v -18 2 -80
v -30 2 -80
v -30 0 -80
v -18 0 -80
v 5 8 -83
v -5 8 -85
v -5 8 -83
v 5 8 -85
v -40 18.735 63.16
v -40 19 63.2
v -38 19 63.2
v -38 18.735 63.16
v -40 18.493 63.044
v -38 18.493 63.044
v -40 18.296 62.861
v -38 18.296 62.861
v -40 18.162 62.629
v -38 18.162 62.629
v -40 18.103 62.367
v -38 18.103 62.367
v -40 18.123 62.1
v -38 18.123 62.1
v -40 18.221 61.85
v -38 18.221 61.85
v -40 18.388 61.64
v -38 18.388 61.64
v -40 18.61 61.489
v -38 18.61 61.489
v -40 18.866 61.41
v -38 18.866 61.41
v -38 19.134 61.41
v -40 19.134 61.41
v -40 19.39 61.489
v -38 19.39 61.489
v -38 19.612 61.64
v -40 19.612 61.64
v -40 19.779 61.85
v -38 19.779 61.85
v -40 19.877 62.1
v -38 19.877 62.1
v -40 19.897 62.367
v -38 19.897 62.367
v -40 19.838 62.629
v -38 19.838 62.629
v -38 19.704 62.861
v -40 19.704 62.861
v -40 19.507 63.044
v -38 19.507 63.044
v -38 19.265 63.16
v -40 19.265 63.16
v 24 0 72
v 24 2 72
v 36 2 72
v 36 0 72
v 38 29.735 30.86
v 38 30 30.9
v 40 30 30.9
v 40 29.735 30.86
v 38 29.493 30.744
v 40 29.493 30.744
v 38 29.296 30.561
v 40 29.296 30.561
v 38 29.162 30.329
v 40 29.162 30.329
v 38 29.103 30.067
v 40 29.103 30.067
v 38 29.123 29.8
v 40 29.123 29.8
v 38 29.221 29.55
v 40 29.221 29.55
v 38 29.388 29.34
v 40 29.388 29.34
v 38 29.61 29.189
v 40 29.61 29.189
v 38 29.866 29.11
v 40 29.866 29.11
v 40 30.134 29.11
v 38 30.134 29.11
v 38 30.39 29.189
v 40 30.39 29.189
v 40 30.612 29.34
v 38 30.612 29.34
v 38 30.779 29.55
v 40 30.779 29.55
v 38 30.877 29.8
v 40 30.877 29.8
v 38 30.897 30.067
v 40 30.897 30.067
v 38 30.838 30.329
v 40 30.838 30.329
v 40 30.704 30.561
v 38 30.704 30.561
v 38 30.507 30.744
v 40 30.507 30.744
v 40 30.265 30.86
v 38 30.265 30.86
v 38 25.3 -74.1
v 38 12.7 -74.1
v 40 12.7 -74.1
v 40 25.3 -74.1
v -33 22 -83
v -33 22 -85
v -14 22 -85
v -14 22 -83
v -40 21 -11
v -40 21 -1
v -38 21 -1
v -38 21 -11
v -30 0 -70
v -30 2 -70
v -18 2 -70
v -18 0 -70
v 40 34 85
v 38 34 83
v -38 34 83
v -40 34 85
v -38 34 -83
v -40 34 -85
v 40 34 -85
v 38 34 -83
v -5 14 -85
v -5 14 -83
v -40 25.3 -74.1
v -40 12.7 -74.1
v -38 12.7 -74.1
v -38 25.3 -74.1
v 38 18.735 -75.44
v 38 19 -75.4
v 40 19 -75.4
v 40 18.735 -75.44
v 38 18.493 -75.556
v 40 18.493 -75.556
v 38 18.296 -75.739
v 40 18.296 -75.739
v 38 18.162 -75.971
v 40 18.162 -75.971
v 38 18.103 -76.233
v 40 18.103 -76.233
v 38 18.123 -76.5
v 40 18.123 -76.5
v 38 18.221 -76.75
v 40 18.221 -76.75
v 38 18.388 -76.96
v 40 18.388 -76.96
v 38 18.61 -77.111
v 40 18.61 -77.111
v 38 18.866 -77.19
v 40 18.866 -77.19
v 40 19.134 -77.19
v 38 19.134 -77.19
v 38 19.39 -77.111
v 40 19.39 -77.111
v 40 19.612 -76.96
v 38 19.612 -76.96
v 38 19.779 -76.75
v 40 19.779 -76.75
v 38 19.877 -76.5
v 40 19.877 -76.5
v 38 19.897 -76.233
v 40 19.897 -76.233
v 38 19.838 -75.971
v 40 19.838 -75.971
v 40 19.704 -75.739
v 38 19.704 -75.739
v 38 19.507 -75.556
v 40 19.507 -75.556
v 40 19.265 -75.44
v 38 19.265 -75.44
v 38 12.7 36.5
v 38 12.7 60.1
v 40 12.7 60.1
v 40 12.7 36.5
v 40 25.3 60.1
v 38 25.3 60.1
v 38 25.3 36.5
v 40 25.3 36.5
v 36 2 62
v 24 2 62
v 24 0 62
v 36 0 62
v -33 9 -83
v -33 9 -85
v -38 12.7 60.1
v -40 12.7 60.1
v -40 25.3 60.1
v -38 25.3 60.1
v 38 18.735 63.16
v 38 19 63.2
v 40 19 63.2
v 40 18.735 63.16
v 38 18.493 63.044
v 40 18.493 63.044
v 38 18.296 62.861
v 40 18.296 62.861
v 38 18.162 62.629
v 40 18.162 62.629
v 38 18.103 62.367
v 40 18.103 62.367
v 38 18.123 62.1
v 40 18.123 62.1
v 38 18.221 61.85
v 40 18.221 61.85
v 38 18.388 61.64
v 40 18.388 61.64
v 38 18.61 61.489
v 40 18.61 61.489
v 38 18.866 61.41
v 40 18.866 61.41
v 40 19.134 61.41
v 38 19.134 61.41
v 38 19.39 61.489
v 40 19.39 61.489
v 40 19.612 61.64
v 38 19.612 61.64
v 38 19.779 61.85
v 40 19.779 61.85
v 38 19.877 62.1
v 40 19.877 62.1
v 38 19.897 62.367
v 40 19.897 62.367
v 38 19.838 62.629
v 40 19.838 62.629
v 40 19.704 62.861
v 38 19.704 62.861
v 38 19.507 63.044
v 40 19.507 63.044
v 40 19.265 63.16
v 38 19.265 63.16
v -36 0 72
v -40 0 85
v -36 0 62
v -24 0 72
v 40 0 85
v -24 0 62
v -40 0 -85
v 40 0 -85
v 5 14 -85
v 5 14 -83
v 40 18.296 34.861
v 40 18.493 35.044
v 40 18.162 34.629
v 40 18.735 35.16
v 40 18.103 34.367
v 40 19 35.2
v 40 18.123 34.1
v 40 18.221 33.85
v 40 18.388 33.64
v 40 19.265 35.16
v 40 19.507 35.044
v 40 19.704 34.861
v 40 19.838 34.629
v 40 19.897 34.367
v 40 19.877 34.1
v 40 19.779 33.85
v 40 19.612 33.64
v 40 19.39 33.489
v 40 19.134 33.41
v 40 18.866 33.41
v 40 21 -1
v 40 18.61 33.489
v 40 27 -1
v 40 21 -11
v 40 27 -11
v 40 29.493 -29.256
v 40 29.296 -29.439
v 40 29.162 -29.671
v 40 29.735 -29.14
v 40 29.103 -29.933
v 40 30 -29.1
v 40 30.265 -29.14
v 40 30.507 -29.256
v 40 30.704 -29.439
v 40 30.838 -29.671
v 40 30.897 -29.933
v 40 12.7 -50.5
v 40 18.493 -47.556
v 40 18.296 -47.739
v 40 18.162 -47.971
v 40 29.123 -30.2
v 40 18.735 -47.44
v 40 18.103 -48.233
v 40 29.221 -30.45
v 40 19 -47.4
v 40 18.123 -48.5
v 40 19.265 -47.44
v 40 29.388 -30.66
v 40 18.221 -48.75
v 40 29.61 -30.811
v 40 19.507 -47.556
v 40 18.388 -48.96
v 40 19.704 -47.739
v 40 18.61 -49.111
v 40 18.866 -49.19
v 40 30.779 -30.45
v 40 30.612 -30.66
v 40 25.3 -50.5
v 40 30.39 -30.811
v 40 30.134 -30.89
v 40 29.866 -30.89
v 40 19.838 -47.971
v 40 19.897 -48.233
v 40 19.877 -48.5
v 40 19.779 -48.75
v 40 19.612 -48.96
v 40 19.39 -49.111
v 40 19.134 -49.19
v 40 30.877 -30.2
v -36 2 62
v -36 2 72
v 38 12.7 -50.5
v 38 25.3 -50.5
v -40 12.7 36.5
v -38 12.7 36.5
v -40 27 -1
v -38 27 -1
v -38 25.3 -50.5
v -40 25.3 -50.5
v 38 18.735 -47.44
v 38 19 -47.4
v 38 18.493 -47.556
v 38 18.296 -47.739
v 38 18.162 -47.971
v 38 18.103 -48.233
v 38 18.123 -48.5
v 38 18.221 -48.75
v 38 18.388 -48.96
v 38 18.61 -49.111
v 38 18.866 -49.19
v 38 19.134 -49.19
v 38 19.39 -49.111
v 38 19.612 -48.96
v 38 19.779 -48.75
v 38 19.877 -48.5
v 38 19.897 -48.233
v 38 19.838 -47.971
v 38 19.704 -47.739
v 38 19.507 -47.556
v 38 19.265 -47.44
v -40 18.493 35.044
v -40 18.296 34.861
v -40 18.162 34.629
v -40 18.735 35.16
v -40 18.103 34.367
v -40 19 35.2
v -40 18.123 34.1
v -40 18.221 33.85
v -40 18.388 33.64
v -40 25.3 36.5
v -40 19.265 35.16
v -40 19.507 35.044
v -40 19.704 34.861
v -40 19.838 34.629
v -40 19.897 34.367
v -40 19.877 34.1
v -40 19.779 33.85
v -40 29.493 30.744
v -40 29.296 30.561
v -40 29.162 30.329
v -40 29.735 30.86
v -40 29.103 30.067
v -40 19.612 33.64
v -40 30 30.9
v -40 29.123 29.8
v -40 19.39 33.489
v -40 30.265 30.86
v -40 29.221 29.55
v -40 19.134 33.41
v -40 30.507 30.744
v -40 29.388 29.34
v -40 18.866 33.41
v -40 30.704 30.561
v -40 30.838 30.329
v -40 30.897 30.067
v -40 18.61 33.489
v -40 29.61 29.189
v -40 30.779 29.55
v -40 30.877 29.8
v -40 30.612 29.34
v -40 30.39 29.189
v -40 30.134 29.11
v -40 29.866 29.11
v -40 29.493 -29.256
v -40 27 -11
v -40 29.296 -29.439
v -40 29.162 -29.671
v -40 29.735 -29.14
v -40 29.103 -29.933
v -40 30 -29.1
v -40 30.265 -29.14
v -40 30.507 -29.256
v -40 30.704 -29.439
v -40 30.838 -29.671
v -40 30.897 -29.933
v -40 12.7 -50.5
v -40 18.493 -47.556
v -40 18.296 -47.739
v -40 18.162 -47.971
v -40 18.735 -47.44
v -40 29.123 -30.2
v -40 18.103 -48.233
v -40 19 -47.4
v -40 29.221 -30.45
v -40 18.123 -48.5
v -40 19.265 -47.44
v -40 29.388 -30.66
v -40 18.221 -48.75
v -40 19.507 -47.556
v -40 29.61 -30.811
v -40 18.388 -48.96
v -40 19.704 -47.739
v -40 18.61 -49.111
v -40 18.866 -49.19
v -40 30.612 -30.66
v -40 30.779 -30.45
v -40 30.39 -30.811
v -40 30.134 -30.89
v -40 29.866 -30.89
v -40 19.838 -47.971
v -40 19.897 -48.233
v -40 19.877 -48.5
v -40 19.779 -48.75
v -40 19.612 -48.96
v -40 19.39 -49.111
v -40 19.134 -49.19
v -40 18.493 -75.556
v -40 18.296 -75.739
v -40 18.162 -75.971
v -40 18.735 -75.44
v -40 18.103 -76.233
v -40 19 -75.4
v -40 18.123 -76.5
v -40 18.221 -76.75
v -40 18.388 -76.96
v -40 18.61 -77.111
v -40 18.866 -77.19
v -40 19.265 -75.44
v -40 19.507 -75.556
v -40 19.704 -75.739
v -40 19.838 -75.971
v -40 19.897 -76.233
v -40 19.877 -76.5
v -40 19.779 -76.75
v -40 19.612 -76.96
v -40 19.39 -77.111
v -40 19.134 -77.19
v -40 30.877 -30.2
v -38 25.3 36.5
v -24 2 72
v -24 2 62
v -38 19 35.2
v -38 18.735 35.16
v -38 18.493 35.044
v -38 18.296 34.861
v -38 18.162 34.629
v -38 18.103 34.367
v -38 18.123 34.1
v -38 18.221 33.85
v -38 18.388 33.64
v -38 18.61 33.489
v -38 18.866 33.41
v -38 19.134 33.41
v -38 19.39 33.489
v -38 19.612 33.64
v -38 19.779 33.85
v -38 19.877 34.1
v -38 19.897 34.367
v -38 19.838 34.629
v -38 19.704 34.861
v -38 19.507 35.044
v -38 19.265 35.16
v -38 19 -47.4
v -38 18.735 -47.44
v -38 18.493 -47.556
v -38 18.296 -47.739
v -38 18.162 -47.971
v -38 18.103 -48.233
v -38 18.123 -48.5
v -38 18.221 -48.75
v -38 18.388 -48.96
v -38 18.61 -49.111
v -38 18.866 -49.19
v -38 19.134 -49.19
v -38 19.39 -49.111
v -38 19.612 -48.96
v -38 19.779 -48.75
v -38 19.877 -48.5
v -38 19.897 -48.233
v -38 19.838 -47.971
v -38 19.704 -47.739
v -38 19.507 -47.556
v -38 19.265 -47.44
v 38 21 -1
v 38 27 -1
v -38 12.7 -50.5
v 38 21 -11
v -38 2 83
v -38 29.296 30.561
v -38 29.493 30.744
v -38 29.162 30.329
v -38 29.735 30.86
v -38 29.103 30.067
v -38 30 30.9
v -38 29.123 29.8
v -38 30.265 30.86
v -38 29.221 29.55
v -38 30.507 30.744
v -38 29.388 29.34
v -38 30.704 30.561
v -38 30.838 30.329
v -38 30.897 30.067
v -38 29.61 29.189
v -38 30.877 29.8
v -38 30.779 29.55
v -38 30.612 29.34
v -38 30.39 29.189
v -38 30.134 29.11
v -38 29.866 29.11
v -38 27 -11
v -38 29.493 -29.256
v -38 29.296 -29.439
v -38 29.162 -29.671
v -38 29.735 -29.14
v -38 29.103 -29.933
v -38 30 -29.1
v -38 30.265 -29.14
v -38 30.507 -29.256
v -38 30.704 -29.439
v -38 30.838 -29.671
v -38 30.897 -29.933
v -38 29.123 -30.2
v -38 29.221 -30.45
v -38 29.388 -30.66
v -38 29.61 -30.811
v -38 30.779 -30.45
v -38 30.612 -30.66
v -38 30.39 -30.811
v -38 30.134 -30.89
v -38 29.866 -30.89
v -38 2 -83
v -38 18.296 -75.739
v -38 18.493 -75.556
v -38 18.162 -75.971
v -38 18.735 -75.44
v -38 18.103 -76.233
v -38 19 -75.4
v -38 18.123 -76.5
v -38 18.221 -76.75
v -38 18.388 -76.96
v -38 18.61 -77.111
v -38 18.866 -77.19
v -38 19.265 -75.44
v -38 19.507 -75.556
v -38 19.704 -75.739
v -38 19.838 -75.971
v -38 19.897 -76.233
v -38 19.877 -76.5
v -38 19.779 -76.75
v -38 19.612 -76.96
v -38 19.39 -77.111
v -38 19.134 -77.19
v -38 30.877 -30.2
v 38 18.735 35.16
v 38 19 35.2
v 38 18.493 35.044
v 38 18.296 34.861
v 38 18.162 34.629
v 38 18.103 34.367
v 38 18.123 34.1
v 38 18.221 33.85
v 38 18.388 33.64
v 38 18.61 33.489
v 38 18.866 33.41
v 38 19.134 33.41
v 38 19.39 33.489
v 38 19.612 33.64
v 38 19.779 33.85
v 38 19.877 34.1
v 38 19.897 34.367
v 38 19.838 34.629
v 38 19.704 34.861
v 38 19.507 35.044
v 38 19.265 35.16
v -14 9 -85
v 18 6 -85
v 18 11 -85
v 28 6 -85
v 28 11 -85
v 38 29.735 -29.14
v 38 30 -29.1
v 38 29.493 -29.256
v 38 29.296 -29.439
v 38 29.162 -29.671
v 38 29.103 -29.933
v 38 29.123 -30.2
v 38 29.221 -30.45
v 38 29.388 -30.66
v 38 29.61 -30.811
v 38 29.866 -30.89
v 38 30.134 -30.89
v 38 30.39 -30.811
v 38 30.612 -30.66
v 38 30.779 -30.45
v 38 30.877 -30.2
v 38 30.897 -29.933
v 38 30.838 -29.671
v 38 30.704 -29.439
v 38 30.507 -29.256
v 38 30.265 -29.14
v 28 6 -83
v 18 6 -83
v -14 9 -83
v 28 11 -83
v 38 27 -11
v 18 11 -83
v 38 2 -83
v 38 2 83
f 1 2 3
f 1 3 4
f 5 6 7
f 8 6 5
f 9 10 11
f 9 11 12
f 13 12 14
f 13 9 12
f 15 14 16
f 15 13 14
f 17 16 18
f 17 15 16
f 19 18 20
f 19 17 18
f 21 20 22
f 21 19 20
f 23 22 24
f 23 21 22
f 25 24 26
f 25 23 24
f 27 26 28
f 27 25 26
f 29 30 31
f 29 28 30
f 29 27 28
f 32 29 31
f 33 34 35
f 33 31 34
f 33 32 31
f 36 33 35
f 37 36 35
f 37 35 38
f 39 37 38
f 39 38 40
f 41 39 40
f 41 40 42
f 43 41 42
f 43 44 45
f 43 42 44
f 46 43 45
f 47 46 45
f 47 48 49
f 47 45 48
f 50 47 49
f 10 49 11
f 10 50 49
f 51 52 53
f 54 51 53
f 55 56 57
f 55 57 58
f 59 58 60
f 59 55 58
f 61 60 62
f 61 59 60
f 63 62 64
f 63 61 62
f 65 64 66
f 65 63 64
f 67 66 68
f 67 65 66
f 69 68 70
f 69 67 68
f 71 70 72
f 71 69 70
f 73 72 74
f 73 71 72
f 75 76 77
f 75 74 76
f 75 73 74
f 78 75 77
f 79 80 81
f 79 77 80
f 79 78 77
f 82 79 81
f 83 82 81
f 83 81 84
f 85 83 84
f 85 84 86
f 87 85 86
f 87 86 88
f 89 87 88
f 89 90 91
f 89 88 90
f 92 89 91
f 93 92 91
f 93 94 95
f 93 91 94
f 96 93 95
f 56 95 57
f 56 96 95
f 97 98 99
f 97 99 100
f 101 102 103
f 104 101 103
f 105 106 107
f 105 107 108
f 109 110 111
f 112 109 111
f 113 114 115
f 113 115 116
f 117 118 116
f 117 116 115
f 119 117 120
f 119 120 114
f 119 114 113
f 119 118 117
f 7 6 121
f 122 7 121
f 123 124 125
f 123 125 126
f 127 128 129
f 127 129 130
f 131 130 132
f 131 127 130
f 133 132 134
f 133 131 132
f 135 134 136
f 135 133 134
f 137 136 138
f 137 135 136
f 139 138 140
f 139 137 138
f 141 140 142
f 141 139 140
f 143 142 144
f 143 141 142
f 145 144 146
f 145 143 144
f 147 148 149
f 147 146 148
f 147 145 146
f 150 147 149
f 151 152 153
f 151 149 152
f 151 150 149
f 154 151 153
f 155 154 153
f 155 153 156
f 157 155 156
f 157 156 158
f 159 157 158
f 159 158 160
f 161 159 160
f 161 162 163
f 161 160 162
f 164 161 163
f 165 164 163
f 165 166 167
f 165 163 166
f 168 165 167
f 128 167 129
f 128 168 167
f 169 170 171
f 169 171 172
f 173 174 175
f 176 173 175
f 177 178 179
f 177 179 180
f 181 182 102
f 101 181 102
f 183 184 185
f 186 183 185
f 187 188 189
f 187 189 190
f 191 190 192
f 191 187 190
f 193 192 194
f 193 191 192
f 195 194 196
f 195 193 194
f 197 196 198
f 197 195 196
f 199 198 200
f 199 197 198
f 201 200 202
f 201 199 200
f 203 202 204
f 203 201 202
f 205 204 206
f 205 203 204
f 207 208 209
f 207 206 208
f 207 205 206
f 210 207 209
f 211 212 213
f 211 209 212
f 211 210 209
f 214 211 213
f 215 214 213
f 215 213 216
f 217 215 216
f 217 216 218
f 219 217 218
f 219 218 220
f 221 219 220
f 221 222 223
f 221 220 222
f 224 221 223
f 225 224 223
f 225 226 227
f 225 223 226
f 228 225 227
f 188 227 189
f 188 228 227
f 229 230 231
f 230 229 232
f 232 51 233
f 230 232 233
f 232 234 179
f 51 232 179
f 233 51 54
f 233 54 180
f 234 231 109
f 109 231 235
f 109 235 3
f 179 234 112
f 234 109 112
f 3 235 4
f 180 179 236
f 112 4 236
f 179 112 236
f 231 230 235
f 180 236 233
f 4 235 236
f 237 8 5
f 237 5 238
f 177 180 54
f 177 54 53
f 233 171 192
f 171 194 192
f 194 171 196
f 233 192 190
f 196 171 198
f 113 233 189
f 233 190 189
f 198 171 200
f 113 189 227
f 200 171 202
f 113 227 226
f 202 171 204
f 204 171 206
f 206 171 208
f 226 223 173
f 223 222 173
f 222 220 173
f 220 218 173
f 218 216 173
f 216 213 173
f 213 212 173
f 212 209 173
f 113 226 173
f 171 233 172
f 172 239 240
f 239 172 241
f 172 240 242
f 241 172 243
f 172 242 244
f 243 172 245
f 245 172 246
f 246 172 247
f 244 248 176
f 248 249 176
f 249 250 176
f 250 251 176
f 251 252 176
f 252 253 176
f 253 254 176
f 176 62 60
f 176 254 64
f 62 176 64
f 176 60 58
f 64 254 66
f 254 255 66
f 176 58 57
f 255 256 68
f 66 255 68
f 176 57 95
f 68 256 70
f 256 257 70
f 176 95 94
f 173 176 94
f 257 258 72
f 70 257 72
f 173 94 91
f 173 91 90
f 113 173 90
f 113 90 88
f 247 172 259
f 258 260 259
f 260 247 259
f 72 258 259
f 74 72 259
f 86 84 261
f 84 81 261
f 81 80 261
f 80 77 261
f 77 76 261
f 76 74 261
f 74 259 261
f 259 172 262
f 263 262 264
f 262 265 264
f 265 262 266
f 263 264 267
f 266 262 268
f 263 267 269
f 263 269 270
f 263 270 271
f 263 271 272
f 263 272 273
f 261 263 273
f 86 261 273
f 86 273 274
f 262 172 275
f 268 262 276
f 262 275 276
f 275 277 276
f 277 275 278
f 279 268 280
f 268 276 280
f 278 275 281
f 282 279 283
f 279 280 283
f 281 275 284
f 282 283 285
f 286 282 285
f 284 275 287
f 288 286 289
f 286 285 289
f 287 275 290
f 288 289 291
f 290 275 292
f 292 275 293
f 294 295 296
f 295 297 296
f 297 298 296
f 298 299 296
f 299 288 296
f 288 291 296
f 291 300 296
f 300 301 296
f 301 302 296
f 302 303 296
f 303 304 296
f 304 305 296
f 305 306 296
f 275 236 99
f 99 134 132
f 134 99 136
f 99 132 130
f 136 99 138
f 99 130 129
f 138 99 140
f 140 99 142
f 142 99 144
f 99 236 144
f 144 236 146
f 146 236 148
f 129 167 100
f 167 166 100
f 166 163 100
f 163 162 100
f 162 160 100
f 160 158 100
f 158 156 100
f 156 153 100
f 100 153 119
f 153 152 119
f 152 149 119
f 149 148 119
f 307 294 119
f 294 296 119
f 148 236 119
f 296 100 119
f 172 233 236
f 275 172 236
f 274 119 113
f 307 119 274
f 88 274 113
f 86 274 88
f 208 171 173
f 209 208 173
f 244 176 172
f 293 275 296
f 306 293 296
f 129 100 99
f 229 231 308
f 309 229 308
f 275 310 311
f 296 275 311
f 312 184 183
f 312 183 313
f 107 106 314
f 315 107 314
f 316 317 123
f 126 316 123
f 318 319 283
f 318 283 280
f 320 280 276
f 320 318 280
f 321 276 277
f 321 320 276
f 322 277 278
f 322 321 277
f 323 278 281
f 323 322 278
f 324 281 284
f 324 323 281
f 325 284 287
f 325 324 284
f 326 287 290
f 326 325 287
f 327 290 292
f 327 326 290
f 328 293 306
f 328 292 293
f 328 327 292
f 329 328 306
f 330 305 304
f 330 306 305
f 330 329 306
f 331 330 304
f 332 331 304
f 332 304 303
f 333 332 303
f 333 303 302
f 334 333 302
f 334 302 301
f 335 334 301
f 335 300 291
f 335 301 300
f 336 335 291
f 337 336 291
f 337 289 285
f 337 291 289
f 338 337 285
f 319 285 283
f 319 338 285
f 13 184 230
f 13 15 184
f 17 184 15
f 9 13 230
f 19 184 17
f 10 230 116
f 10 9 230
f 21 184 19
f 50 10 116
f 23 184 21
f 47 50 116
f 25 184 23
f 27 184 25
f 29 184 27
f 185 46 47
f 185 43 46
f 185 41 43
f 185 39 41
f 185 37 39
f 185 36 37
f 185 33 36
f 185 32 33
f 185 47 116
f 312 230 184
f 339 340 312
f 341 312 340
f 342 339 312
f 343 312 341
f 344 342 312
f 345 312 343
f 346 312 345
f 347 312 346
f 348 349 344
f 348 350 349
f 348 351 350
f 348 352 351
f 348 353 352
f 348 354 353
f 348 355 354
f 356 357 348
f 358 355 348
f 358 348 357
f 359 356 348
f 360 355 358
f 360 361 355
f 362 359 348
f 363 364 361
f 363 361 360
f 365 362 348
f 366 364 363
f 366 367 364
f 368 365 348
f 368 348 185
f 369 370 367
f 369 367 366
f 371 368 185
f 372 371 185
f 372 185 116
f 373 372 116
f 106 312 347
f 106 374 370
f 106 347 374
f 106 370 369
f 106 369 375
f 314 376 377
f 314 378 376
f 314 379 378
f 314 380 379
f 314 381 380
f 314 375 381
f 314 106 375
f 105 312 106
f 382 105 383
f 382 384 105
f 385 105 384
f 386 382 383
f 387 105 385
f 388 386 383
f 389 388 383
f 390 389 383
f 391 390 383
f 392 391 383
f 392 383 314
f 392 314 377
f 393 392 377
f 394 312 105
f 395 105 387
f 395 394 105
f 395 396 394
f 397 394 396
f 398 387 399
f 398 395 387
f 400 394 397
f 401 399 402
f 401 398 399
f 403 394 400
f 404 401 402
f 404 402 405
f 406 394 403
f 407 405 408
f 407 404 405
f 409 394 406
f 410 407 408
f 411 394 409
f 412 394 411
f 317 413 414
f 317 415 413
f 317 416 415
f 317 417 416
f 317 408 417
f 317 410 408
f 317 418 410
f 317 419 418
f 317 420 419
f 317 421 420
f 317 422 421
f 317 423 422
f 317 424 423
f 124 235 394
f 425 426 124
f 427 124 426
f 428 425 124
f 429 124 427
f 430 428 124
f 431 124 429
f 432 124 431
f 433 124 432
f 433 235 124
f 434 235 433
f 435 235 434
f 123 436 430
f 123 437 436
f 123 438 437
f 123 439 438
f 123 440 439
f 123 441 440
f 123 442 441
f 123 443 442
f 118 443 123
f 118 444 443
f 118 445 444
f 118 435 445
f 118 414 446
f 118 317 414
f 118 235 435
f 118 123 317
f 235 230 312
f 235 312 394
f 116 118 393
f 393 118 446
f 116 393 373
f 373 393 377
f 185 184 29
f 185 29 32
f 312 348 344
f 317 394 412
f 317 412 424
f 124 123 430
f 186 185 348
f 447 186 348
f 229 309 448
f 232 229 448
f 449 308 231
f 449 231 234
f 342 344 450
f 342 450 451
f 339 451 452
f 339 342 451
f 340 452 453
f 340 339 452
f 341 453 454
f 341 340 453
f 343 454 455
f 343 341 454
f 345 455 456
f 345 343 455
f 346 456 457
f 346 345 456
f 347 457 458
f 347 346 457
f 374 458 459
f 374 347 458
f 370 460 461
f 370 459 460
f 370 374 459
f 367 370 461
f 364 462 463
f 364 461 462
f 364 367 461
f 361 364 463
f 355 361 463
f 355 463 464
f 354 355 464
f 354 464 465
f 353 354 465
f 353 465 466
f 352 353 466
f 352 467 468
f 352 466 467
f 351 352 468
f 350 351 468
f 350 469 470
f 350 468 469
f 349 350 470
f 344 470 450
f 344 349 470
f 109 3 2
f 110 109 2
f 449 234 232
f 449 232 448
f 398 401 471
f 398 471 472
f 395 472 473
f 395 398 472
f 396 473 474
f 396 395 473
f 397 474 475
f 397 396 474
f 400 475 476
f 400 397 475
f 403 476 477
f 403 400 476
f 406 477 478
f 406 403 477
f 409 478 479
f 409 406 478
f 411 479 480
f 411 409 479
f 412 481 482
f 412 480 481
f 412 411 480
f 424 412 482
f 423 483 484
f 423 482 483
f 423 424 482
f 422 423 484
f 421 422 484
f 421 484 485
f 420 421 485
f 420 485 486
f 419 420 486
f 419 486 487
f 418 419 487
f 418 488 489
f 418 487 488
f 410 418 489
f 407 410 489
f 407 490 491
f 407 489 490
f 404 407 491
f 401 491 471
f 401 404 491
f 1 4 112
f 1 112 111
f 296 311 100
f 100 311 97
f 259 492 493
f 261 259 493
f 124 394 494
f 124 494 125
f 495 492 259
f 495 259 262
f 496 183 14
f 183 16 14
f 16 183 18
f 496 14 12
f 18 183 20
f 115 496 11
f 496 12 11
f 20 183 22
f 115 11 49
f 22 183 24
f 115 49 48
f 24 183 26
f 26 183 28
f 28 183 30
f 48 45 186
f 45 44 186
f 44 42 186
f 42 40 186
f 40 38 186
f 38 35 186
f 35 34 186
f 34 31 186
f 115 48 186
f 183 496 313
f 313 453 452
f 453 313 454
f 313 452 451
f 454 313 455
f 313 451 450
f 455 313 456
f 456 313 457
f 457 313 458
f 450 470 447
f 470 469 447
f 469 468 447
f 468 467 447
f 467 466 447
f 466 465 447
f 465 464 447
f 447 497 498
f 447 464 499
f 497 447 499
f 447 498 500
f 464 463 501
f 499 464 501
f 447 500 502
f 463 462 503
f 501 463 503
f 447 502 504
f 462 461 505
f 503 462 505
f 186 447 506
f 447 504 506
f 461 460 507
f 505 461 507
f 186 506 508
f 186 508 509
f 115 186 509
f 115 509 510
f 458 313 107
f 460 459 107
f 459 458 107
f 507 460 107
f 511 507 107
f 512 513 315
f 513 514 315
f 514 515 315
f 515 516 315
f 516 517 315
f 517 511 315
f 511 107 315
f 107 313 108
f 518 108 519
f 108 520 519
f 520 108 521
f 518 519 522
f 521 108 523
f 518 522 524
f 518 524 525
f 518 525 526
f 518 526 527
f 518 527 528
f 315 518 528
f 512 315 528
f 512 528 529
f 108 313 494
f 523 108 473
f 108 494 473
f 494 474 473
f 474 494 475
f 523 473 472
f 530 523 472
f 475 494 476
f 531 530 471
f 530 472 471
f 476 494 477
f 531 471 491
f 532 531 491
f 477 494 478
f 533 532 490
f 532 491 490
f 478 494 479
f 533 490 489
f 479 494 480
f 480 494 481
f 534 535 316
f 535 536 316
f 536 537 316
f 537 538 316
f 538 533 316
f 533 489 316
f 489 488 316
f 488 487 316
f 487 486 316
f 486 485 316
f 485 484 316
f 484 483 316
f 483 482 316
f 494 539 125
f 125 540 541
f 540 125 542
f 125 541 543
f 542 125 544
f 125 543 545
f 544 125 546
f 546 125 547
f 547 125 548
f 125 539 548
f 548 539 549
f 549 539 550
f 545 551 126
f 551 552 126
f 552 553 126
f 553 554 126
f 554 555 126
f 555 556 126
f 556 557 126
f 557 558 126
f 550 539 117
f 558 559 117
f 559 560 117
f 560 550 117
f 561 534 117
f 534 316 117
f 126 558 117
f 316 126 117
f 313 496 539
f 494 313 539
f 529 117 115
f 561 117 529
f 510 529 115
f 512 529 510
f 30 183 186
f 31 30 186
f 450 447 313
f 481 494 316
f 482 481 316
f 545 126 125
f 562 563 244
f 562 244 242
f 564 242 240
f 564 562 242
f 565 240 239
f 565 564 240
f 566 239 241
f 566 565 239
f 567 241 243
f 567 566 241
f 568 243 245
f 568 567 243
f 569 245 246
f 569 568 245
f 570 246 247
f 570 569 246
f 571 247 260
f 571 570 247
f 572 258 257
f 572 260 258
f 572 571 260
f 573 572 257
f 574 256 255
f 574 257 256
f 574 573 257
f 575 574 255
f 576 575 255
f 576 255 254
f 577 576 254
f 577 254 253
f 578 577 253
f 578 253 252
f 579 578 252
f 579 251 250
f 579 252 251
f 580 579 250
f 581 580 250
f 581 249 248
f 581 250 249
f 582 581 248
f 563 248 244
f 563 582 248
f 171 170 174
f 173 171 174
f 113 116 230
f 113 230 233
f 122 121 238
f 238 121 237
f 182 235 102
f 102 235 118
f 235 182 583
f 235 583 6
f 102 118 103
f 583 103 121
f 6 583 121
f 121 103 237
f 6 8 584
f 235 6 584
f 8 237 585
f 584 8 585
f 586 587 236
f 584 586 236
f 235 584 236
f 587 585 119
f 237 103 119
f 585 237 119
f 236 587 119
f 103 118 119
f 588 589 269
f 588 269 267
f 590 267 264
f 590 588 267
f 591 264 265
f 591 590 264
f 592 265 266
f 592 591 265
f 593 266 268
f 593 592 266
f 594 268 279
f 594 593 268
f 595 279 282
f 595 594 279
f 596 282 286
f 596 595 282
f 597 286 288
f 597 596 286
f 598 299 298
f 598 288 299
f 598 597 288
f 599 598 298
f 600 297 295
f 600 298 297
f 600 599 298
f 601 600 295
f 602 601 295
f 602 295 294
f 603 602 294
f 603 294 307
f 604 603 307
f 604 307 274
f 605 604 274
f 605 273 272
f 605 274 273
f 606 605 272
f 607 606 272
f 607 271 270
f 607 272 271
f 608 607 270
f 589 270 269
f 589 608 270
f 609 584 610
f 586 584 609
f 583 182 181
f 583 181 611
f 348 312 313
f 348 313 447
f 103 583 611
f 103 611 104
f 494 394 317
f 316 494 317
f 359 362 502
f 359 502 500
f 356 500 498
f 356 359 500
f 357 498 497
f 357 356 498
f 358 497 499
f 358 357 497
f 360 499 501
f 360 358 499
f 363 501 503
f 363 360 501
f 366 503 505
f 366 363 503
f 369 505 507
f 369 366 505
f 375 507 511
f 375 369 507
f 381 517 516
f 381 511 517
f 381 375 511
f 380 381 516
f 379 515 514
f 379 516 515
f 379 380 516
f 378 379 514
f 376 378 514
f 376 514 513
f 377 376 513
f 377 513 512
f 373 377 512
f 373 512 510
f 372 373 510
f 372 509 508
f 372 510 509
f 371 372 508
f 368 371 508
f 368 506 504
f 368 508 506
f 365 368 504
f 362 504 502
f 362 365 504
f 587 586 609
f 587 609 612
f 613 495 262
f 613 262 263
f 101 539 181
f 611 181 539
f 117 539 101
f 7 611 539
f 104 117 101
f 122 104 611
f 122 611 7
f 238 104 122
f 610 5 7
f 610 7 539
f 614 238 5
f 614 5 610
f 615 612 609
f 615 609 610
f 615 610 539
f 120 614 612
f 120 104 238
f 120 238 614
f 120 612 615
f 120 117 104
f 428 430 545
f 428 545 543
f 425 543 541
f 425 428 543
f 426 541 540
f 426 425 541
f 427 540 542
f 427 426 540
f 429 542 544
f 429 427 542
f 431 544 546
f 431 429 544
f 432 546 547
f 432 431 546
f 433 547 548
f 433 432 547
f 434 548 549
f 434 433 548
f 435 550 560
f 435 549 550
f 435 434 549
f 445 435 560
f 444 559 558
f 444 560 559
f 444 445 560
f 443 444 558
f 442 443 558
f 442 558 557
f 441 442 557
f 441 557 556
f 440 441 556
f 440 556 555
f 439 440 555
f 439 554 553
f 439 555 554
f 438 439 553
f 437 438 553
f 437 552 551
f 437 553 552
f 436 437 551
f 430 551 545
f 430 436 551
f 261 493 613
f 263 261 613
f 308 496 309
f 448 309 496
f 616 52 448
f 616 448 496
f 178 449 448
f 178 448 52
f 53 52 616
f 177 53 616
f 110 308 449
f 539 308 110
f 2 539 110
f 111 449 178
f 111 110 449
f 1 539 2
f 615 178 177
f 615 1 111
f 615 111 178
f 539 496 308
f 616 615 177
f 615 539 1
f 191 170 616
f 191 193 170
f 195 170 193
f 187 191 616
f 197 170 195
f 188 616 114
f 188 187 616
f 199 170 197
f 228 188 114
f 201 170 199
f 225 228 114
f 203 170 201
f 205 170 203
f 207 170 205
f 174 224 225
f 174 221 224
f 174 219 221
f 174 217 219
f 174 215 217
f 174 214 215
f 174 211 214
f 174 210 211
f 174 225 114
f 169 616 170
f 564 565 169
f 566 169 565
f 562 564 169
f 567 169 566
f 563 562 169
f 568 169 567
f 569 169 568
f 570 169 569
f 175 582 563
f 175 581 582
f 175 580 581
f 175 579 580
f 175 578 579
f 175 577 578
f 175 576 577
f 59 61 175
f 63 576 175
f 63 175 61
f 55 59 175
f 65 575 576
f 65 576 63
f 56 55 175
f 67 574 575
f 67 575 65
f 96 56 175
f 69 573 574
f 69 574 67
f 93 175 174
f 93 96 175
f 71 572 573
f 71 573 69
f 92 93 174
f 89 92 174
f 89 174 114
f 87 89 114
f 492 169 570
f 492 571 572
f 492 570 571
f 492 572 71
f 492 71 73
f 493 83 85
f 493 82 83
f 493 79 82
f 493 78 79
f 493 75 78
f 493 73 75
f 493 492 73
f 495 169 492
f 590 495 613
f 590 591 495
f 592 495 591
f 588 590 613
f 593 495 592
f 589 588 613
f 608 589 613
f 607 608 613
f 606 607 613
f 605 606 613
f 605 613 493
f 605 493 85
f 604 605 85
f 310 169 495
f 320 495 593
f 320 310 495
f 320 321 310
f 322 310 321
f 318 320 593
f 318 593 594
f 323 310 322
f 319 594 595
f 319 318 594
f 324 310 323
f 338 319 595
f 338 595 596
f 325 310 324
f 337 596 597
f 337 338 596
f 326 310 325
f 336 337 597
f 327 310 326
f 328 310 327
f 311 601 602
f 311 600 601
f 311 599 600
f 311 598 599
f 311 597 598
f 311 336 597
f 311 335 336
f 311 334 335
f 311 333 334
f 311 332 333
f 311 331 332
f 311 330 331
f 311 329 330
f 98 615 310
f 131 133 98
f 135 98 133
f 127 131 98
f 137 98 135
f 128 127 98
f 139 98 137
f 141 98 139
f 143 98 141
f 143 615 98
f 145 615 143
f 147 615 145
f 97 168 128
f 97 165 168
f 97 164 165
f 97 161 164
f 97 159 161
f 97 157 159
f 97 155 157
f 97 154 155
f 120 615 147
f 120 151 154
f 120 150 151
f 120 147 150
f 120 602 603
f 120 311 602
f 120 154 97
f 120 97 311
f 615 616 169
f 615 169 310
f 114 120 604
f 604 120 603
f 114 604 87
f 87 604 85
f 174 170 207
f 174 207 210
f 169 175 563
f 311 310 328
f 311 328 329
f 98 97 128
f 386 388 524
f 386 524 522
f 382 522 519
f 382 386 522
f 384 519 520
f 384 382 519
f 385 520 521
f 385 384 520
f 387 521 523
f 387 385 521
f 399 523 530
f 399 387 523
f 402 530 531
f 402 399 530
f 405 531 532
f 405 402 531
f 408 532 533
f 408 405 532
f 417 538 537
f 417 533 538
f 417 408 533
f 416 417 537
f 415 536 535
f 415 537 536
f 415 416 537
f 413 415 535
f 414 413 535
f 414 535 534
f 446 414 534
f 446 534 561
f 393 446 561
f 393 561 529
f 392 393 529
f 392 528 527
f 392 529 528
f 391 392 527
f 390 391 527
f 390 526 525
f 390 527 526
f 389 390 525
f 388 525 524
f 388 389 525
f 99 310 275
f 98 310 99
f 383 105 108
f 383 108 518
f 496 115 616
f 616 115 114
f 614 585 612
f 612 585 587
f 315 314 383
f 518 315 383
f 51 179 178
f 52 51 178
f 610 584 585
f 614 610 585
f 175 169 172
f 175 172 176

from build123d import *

# Parameters (mm, degrees)
BOSS_EXTRUDE1_START  = -85
SKETCH1_W            = 80
SKETCH1_H            = 34
BOSS_EXTRUDE1_DEPTH  = 170
BOSS_EXTRUDE2_START  = -83
SKETCH2_W            = 76
SKETCH2_H            = 38
BOSS_EXTRUDE2_DEPTH  = 166
BOSS_EXTRUDE3_START  = -45
SKETCH3_W            = 23.6
SKETCH3_H            = 12.6
BOSS_EXTRUDE3_DEPTH  = 90
BOSS_EXTRUDE4_START  = -45
SKETCH4_R            = 0.9
BOSS_EXTRUDE4_DEPTH  = 90
BOSS_EXTRUDE5_START  = -45
SKETCH5_R            = 0.9
BOSS_EXTRUDE5_DEPTH  = 90
BOSS_EXTRUDE6_START  = -45
SKETCH6_W            = 23.6
SKETCH6_H            = 12.6
BOSS_EXTRUDE6_DEPTH  = 90
BOSS_EXTRUDE7_START  = -45
SKETCH7_R            = 0.9
BOSS_EXTRUDE7_DEPTH  = 90
BOSS_EXTRUDE8_START  = -45
SKETCH8_R            = 0.9
BOSS_EXTRUDE8_DEPTH  = 90
BOSS_EXTRUDE9_START  = -45
SKETCH9_W            = 10
SKETCH9_H            = 6
BOSS_EXTRUDE9_DEPTH  = 90
BOSS_EXTRUDE10_START = -90
SKETCH10_W           = 10
SKETCH10_H           = 6
BOSS_EXTRUDE10_DEPTH = 10
BOSS_EXTRUDE11_START = -90
SKETCH11_W           = 10
SKETCH11_H           = 5
BOSS_EXTRUDE11_DEPTH = 10
BOSS_EXTRUDE12_START = -90
SKETCH12_W           = 19
SKETCH12_H           = 13
BOSS_EXTRUDE12_DEPTH = 10
BOSS_EXTRUDE13_START = 62
SKETCH13_W           = 12
SKETCH13_H           = 4
BOSS_EXTRUDE13_DEPTH = 10
BOSS_EXTRUDE14_START = 62
SKETCH14_W           = 12
SKETCH14_H           = 4
BOSS_EXTRUDE14_DEPTH = 10
BOSS_EXTRUDE15_START = -80
SKETCH15_W           = 12
SKETCH15_H           = 4
BOSS_EXTRUDE15_DEPTH = 10
BOSS_EXTRUDE16_START = -45
SKETCH16_R           = 0.9
BOSS_EXTRUDE16_DEPTH = 90
BOSS_EXTRUDE17_START = -45
SKETCH17_R           = 0.9
BOSS_EXTRUDE17_DEPTH = 90


with BuildPart() as part:
    # Sketch1 → Boss-Extrude1 (new body)
    with BuildSketch(Plane.XY.offset(BOSS_EXTRUDE1_START)):
        with Locations((0, 17)):
            Rectangle(SKETCH1_W, SKETCH1_H)
    extrude(amount=BOSS_EXTRUDE1_DEPTH)


with BuildPart() as body_2:
    # Sketch2 → Boss-Extrude2 (new body)
    with BuildSketch(Plane.XY.offset(BOSS_EXTRUDE2_START)):
        with Locations((0, 21)):
            Rectangle(SKETCH2_W, SKETCH2_H)
    extrude(amount=BOSS_EXTRUDE2_DEPTH)


with BuildPart() as part_1:
    add(part.part)

    # Combine1: cut body 2
    add(body_2.part, mode=Mode.SUBTRACT)


with BuildPart() as body_2_2:
    # Sketch3 → Boss-Extrude3 (new body)
    with BuildSketch(Plane(origin=(0, 0, 0), x_dir=(0, 0, -1), z_dir=(1, 0, 0)).offset(BOSS_EXTRUDE3_START)):
        with Locations((-48.3, 19)):
            Rectangle(SKETCH3_W, SKETCH3_H)
    extrude(amount=BOSS_EXTRUDE3_DEPTH)


with BuildPart() as part_2:
    add(part_1.part)

    # Combine2: cut body 2 2
    add(body_2_2.part, mode=Mode.SUBTRACT)


with BuildPart() as body_2_3:
    # Sketch4 → Boss-Extrude4 (new body)
    with BuildSketch(Plane(origin=(0, 0, 0), x_dir=(0, 0, -1), z_dir=(1, 0, 0)).offset(BOSS_EXTRUDE4_START)):
        with Locations((-34.3, 19)):
            Circle(SKETCH4_R)
    extrude(amount=BOSS_EXTRUDE4_DEPTH)


with BuildPart() as part_3:
    add(part_2.part)

    # Combine3: cut body 2 3
    add(body_2_3.part, mode=Mode.SUBTRACT)


with BuildPart() as body_2_4:
    # Sketch5 → Boss-Extrude5 (new body)
    with BuildSketch(Plane(origin=(0, 0, 0), x_dir=(0, 0, -1), z_dir=(1, 0, 0)).offset(BOSS_EXTRUDE5_START)):
        with Locations((-62.3, 19)):
            Circle(SKETCH5_R)
    extrude(amount=BOSS_EXTRUDE5_DEPTH)


with BuildPart() as part_4:
    add(part_3.part)

    # Combine4: cut body 2 4
    add(body_2_4.part, mode=Mode.SUBTRACT)


with BuildPart() as body_2_5:
    # Sketch6 → Boss-Extrude6 (new body)
    with BuildSketch(Plane(origin=(0, 0, 0), x_dir=(0, 0, -1), z_dir=(1, 0, 0)).offset(BOSS_EXTRUDE6_START)):
        with Locations((62.3, 19)):
            Rectangle(SKETCH6_W, SKETCH6_H)
    extrude(amount=BOSS_EXTRUDE6_DEPTH)


with BuildPart() as part_5:
    add(part_4.part)

    # Combine5: cut body 2 5
    add(body_2_5.part, mode=Mode.SUBTRACT)


with BuildPart() as body_2_6:
    # Sketch7 → Boss-Extrude7 (new body)
    with BuildSketch(Plane(origin=(0, 0, 0), x_dir=(0, 0, -1), z_dir=(1, 0, 0)).offset(BOSS_EXTRUDE7_START)):
        with Locations((76.3, 19)):
            Circle(SKETCH7_R)
    extrude(amount=BOSS_EXTRUDE7_DEPTH)


with BuildPart() as part_6:
    add(part_5.part)

    # Combine6: cut body 2 6
    add(body_2_6.part, mode=Mode.SUBTRACT)


with BuildPart() as body_2_7:
    # Sketch8 → Boss-Extrude8 (new body)
    with BuildSketch(Plane(origin=(0, 0, 0), x_dir=(0, 0, -1), z_dir=(1, 0, 0)).offset(BOSS_EXTRUDE8_START)):
        with Locations((48.3, 19)):
            Circle(SKETCH8_R)
    extrude(amount=BOSS_EXTRUDE8_DEPTH)


with BuildPart() as part_7:
    add(part_6.part)

    # Combine7: cut body 2 7
    add(body_2_7.part, mode=Mode.SUBTRACT)


with BuildPart() as body_2_8:
    # Sketch9 → Boss-Extrude9 (new body)
    with BuildSketch(Plane(origin=(0, 0, 0), x_dir=(0, 0, -1), z_dir=(1, 0, 0)).offset(BOSS_EXTRUDE9_START)):
        with Locations((6, 24)):
            Rectangle(SKETCH9_W, SKETCH9_H)
    extrude(amount=BOSS_EXTRUDE9_DEPTH)


with BuildPart() as part_8:
    add(part_7.part)

    # Combine8: cut body 2 8
    add(body_2_8.part, mode=Mode.SUBTRACT)


with BuildPart() as body_2_9:
    # Sketch10 → Boss-Extrude10 (new body)
    with BuildSketch(Plane.XY.offset(BOSS_EXTRUDE10_START)):
        with Locations((0, 11)):
            Rectangle(SKETCH10_W, SKETCH10_H)
    extrude(amount=BOSS_EXTRUDE10_DEPTH)


with BuildPart() as part_9:
    add(part_8.part)

    # Combine9: cut body 2 9
    add(body_2_9.part, mode=Mode.SUBTRACT)


with BuildPart() as body_2_10:
    # Sketch11 → Boss-Extrude11 (new body)
    with BuildSketch(Plane.XY.offset(BOSS_EXTRUDE11_START)):
        with Locations((23, 8.5)):
            Rectangle(SKETCH11_W, SKETCH11_H)
    extrude(amount=BOSS_EXTRUDE11_DEPTH)


with BuildPart() as part_10:
    add(part_9.part)

    # Combine10: cut body 2 10
    add(body_2_10.part, mode=Mode.SUBTRACT)


with BuildPart() as body_2_11:
    # Sketch12 → Boss-Extrude12 (new body)
    with BuildSketch(Plane.XY.offset(BOSS_EXTRUDE12_START)):
        with Locations((-23.5, 15.5)):
            Rectangle(SKETCH12_W, SKETCH12_H)
    extrude(amount=BOSS_EXTRUDE12_DEPTH)


with BuildPart() as part_11:
    add(part_10.part)

    # Combine11: cut body 2 11
    add(body_2_11.part, mode=Mode.SUBTRACT)


with BuildPart() as body_2_12:
    # Sketch13 → Boss-Extrude13 (new body)
    with BuildSketch(Plane.XY.offset(BOSS_EXTRUDE13_START)):
        with Locations((-30, 1)):
            Rectangle(SKETCH13_W, SKETCH13_H)
    extrude(amount=BOSS_EXTRUDE13_DEPTH)


with BuildPart() as part_12:
    add(part_11.part)

    # Combine12: cut body 2 12
    add(body_2_12.part, mode=Mode.SUBTRACT)


with BuildPart() as body_2_13:
    # Sketch14 → Boss-Extrude14 (new body)
    with BuildSketch(Plane.XY.offset(BOSS_EXTRUDE14_START)):
        with Locations((30, 1)):
            Rectangle(SKETCH14_W, SKETCH14_H)
    extrude(amount=BOSS_EXTRUDE14_DEPTH)


with BuildPart() as part_13:
    add(part_12.part)

    # Combine13: cut body 2 13
    add(body_2_13.part, mode=Mode.SUBTRACT)


with BuildPart() as body_2_14:
    # Sketch15 → Boss-Extrude15 (new body)
    with BuildSketch(Plane.XY.offset(BOSS_EXTRUDE15_START)):
        with Locations((-24, 1)):
            Rectangle(SKETCH15_W, SKETCH15_H)
    extrude(amount=BOSS_EXTRUDE15_DEPTH)


with BuildPart() as part_14:
    add(part_13.part)

    # Combine14: cut body 2 14
    add(body_2_14.part, mode=Mode.SUBTRACT)


with BuildPart() as body_2_15:
    # Sketch16 → Boss-Extrude16 (new body)
    with BuildSketch(Plane(origin=(0, 0, 0), x_dir=(0, 0, -1), z_dir=(1, 0, 0)).offset(BOSS_EXTRUDE16_START)):
        with Locations((30, 30)):
            Circle(SKETCH16_R)
    extrude(amount=BOSS_EXTRUDE16_DEPTH)


with BuildPart() as part_15:
    add(part_14.part)

    # Combine15: cut body 2 15
    add(body_2_15.part, mode=Mode.SUBTRACT)


with BuildPart() as body_2_16:
    # Sketch17 → Boss-Extrude17 (new body)
    with BuildSketch(Plane(origin=(0, 0, 0), x_dir=(0, 0, -1), z_dir=(1, 0, 0)).offset(BOSS_EXTRUDE17_START)):
        with Locations((-30, 30)):
            Circle(SKETCH17_R)
    extrude(amount=BOSS_EXTRUDE17_DEPTH)


with BuildPart() as part_16:
    add(part_15.part)

    # Combine16: cut body 2 16
    add(body_2_16.part, mode=Mode.SUBTRACT)


solid = part_16.part
